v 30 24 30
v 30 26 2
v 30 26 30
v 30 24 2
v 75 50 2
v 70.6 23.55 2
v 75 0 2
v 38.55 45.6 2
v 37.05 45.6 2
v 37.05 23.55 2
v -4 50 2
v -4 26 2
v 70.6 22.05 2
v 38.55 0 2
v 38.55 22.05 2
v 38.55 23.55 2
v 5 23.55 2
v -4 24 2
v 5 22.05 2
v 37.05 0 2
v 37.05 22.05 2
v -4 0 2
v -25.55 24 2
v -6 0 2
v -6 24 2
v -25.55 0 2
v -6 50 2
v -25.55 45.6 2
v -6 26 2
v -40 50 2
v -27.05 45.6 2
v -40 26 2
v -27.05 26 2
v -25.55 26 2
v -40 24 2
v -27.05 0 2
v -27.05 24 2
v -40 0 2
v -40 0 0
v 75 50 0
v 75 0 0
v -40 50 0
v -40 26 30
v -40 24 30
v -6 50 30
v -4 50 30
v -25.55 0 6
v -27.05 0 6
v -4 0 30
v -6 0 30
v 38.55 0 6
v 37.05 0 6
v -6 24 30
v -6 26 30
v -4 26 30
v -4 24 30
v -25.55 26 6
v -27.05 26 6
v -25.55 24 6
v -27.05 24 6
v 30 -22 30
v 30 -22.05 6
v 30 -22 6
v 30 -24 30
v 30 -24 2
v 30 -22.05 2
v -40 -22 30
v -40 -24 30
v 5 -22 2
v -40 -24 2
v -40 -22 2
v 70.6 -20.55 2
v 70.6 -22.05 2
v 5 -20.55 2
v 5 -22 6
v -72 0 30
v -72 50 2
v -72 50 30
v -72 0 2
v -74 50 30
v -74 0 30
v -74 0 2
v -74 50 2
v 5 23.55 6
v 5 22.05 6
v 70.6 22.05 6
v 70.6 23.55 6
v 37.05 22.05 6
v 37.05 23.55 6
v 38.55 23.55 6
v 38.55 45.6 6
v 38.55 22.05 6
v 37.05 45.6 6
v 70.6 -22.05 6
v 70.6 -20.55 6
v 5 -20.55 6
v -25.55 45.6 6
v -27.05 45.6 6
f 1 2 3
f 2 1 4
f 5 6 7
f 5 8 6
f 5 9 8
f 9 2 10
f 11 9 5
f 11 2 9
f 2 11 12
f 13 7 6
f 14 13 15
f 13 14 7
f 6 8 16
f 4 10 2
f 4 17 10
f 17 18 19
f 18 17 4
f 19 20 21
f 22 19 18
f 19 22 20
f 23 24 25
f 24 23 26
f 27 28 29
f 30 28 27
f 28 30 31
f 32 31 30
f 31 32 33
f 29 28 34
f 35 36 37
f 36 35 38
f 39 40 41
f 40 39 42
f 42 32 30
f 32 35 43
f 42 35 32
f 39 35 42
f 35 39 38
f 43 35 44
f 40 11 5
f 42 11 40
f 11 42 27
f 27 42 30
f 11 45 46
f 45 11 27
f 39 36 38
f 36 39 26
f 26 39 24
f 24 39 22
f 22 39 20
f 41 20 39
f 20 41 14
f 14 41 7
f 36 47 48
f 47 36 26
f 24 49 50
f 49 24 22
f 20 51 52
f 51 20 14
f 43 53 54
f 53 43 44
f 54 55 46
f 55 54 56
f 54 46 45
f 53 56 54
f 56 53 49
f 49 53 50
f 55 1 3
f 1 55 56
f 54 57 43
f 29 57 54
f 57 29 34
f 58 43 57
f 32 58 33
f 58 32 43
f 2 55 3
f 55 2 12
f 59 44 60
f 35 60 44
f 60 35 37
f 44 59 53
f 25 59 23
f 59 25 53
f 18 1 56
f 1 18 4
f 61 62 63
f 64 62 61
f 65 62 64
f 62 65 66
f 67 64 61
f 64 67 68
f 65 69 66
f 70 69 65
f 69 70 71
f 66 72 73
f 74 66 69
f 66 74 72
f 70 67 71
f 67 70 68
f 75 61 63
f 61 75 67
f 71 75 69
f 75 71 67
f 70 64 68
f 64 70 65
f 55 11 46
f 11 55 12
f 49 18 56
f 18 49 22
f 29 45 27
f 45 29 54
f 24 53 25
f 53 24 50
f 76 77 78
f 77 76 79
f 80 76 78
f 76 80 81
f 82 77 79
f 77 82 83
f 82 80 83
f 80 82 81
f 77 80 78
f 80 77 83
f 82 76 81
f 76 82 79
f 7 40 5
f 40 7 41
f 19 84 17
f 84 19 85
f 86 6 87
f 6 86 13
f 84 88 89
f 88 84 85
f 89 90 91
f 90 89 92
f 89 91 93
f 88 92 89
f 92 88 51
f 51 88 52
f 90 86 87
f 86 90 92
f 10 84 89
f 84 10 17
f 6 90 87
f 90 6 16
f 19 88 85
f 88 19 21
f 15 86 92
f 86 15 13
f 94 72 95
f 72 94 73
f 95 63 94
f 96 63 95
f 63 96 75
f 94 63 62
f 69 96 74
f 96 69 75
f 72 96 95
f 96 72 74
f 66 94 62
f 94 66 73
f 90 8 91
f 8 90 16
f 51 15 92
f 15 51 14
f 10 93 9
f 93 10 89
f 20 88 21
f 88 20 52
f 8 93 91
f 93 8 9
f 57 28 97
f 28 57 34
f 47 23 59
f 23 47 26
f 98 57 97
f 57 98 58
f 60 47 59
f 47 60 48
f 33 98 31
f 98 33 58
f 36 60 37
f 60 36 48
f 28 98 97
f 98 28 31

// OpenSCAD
// Units: millimetres
// $fn = 64; // Default for curved shapes, but we use it explicitly where needed

// --- Part 1: Box ---
// Outer dimensions
box_outer_x = 70;
box_outer_y = 50;
box_outer_z = 30;

// Wall and floor thickness
box_wall_thick = 2;
box_floor_thick = 2;

// Clearance for lid (0.2mm per side)
box_clearance = 0.2;

// Inner dimensions calculated from outer
box_inner_x = box_outer_x - 2 * box_wall_thick;
box_inner_y = box_outer_y - 2 * box_wall_thick;
box_inner_z = box_outer_z - box_floor_thick; // Open top, so height is floor thickness

// Position for Part 1 (Box)
// Centered on X, Y=0, Z=0.
// We will place it at x = - (box_outer_x/2 + 5) to leave 10mm gap with Part 2
box_pos_x = - (box_outer_x / 2 + 5);
box_pos_y = 0;
box_pos_z = 0;

// --- Part 2: Lid ---
// Plate dimensions (base)
lid_plate_x = 70;
lid_plate_y = 50;
lid_plate_z = 2;

// Lip dimensions
lip_wall_thick = 1.5;
lip_height = 4;
lip_outer_x = 65.6;
lip_outer_y = 45.6;

// Position for Part 2 (Lid)
// Placed on +X side of box with 10mm gap.
// Box right edge is at box_pos_x + box_outer_x/2.
// Gap is 10mm.
lid_pos_x = box_pos_x + box_outer_x/2 + 10;
lid_pos_y = 0;
lid_pos_z = 0;

// --- Construction ---

module box_part() {
    // Base plate (floor)
    translate([box_pos_x, box_pos_y, box_pos_z])
        cube([box_outer_x, box_outer_y, box_floor_thick]);

    // Walls (4 walls)
    // Front wall (Y positive)
    translate([box_pos_x, box_pos_y + box_outer_y/2 - box_wall_thick/2, box_floor_thick])
        cube([box_outer_x, box_wall_thick, box_outer_z - box_floor_thick]);
    
    // Back wall (Y negative)
    translate([box_pos_x, box_pos_y - box_outer_y/2 + box_wall_thick/2, box_floor_thick])
        cube([box_outer_x, box_wall_thick, box_outer_z - box_floor_thick]);
    
    // Left wall (X negative)
    translate([box_pos_x + box_outer_x/2 - box_wall_thick/2, box_pos_y, box_floor_thick])
        cube([box_wall_thick, box_outer_y, box_outer_z - box_floor_thick]);
    
    // Right wall (X positive)
    translate([box_pos_x - box_outer_x/2 + box_wall_thick/2, box_pos_y, box_floor_thick])
        cube([box_wall_thick, box_outer_y, box_outer_z - box_floor_thick]);
}

module lid_part() {
    // Base plate
    translate([lid_pos_x, lid_pos_y, lid_pos_z])
        cube([lid_plate_x, lid_plate_y, lid_plate_z]);

    // Lip (Rectangular wall)
    // The lip is centered on the plate.
    // We create a hollow box for the lip and subtract it from the plate? 
    // No, the lip is a wall on top. We can model it as a hollow box sitting on the plate.
    // To ensure it's a solid part, we can use a difference or just build the walls.
    // Let's model the lip as a hollow box and subtract the inner part from the plate?
    // Actually, simpler: Create the plate. Then create the lip walls as 4 separate cubes.
    // But the lip is a "wall" 1.5mm thick.
    // Let's create the lip as a hollow box and subtract the inner part from the plate?
    // No, the plate is 2mm thick. The lip sits on top.
    // Let's create the lip as a hollow box and subtract the inner part from the plate?
    // Actually, the best way to ensure a solid is to use a difference on the plate to create the lip walls?
    // No, let's just build the walls as separate cubes and union them.
    
    // Lip outer dimensions
    lip_x = lip_outer_x;
    lip_y = lip_outer_y;
    lip_z = lip_height;
    
    // Center the lip on the plate
    lip_center_x = lid_pos_x;
    lip_center_y = lid_pos_y;
    lip_base_z = lid_pos_z + lid_plate_z;

    // Front wall (Y positive)
    translate([lip_center_x, lip_center_y + lip_y/2 - lip_wall_thick/2, lip_base_z])
        cube([lip_x, lip_wall_thick, lip_z]);
        
    // Back wall (Y negative)
    translate([lip_center_x, lip_center_y - lip_y/2 + lip_wall_thick/2, lip_base_z])
        cube([lip_x, lip_wall_thick, lip_z]);
        
    // Left wall (X negative)
    translate([lip_center_x + lip_x/2 - lip_wall_thick/2, lip_center_y, lip_base_z])
        cube([lip_wall_thick, lip_y, lip_z]);
        
    // Right wall (X positive)
    translate([lip_center_x - lip_x/2 + lip_wall_thick/2, lip_center_y, lip_base_z])
        cube([lip_wall_thick, lip_y, lip_z]);
}

// Combine both parts
union() {
    box_part();
    lid_part();
}
